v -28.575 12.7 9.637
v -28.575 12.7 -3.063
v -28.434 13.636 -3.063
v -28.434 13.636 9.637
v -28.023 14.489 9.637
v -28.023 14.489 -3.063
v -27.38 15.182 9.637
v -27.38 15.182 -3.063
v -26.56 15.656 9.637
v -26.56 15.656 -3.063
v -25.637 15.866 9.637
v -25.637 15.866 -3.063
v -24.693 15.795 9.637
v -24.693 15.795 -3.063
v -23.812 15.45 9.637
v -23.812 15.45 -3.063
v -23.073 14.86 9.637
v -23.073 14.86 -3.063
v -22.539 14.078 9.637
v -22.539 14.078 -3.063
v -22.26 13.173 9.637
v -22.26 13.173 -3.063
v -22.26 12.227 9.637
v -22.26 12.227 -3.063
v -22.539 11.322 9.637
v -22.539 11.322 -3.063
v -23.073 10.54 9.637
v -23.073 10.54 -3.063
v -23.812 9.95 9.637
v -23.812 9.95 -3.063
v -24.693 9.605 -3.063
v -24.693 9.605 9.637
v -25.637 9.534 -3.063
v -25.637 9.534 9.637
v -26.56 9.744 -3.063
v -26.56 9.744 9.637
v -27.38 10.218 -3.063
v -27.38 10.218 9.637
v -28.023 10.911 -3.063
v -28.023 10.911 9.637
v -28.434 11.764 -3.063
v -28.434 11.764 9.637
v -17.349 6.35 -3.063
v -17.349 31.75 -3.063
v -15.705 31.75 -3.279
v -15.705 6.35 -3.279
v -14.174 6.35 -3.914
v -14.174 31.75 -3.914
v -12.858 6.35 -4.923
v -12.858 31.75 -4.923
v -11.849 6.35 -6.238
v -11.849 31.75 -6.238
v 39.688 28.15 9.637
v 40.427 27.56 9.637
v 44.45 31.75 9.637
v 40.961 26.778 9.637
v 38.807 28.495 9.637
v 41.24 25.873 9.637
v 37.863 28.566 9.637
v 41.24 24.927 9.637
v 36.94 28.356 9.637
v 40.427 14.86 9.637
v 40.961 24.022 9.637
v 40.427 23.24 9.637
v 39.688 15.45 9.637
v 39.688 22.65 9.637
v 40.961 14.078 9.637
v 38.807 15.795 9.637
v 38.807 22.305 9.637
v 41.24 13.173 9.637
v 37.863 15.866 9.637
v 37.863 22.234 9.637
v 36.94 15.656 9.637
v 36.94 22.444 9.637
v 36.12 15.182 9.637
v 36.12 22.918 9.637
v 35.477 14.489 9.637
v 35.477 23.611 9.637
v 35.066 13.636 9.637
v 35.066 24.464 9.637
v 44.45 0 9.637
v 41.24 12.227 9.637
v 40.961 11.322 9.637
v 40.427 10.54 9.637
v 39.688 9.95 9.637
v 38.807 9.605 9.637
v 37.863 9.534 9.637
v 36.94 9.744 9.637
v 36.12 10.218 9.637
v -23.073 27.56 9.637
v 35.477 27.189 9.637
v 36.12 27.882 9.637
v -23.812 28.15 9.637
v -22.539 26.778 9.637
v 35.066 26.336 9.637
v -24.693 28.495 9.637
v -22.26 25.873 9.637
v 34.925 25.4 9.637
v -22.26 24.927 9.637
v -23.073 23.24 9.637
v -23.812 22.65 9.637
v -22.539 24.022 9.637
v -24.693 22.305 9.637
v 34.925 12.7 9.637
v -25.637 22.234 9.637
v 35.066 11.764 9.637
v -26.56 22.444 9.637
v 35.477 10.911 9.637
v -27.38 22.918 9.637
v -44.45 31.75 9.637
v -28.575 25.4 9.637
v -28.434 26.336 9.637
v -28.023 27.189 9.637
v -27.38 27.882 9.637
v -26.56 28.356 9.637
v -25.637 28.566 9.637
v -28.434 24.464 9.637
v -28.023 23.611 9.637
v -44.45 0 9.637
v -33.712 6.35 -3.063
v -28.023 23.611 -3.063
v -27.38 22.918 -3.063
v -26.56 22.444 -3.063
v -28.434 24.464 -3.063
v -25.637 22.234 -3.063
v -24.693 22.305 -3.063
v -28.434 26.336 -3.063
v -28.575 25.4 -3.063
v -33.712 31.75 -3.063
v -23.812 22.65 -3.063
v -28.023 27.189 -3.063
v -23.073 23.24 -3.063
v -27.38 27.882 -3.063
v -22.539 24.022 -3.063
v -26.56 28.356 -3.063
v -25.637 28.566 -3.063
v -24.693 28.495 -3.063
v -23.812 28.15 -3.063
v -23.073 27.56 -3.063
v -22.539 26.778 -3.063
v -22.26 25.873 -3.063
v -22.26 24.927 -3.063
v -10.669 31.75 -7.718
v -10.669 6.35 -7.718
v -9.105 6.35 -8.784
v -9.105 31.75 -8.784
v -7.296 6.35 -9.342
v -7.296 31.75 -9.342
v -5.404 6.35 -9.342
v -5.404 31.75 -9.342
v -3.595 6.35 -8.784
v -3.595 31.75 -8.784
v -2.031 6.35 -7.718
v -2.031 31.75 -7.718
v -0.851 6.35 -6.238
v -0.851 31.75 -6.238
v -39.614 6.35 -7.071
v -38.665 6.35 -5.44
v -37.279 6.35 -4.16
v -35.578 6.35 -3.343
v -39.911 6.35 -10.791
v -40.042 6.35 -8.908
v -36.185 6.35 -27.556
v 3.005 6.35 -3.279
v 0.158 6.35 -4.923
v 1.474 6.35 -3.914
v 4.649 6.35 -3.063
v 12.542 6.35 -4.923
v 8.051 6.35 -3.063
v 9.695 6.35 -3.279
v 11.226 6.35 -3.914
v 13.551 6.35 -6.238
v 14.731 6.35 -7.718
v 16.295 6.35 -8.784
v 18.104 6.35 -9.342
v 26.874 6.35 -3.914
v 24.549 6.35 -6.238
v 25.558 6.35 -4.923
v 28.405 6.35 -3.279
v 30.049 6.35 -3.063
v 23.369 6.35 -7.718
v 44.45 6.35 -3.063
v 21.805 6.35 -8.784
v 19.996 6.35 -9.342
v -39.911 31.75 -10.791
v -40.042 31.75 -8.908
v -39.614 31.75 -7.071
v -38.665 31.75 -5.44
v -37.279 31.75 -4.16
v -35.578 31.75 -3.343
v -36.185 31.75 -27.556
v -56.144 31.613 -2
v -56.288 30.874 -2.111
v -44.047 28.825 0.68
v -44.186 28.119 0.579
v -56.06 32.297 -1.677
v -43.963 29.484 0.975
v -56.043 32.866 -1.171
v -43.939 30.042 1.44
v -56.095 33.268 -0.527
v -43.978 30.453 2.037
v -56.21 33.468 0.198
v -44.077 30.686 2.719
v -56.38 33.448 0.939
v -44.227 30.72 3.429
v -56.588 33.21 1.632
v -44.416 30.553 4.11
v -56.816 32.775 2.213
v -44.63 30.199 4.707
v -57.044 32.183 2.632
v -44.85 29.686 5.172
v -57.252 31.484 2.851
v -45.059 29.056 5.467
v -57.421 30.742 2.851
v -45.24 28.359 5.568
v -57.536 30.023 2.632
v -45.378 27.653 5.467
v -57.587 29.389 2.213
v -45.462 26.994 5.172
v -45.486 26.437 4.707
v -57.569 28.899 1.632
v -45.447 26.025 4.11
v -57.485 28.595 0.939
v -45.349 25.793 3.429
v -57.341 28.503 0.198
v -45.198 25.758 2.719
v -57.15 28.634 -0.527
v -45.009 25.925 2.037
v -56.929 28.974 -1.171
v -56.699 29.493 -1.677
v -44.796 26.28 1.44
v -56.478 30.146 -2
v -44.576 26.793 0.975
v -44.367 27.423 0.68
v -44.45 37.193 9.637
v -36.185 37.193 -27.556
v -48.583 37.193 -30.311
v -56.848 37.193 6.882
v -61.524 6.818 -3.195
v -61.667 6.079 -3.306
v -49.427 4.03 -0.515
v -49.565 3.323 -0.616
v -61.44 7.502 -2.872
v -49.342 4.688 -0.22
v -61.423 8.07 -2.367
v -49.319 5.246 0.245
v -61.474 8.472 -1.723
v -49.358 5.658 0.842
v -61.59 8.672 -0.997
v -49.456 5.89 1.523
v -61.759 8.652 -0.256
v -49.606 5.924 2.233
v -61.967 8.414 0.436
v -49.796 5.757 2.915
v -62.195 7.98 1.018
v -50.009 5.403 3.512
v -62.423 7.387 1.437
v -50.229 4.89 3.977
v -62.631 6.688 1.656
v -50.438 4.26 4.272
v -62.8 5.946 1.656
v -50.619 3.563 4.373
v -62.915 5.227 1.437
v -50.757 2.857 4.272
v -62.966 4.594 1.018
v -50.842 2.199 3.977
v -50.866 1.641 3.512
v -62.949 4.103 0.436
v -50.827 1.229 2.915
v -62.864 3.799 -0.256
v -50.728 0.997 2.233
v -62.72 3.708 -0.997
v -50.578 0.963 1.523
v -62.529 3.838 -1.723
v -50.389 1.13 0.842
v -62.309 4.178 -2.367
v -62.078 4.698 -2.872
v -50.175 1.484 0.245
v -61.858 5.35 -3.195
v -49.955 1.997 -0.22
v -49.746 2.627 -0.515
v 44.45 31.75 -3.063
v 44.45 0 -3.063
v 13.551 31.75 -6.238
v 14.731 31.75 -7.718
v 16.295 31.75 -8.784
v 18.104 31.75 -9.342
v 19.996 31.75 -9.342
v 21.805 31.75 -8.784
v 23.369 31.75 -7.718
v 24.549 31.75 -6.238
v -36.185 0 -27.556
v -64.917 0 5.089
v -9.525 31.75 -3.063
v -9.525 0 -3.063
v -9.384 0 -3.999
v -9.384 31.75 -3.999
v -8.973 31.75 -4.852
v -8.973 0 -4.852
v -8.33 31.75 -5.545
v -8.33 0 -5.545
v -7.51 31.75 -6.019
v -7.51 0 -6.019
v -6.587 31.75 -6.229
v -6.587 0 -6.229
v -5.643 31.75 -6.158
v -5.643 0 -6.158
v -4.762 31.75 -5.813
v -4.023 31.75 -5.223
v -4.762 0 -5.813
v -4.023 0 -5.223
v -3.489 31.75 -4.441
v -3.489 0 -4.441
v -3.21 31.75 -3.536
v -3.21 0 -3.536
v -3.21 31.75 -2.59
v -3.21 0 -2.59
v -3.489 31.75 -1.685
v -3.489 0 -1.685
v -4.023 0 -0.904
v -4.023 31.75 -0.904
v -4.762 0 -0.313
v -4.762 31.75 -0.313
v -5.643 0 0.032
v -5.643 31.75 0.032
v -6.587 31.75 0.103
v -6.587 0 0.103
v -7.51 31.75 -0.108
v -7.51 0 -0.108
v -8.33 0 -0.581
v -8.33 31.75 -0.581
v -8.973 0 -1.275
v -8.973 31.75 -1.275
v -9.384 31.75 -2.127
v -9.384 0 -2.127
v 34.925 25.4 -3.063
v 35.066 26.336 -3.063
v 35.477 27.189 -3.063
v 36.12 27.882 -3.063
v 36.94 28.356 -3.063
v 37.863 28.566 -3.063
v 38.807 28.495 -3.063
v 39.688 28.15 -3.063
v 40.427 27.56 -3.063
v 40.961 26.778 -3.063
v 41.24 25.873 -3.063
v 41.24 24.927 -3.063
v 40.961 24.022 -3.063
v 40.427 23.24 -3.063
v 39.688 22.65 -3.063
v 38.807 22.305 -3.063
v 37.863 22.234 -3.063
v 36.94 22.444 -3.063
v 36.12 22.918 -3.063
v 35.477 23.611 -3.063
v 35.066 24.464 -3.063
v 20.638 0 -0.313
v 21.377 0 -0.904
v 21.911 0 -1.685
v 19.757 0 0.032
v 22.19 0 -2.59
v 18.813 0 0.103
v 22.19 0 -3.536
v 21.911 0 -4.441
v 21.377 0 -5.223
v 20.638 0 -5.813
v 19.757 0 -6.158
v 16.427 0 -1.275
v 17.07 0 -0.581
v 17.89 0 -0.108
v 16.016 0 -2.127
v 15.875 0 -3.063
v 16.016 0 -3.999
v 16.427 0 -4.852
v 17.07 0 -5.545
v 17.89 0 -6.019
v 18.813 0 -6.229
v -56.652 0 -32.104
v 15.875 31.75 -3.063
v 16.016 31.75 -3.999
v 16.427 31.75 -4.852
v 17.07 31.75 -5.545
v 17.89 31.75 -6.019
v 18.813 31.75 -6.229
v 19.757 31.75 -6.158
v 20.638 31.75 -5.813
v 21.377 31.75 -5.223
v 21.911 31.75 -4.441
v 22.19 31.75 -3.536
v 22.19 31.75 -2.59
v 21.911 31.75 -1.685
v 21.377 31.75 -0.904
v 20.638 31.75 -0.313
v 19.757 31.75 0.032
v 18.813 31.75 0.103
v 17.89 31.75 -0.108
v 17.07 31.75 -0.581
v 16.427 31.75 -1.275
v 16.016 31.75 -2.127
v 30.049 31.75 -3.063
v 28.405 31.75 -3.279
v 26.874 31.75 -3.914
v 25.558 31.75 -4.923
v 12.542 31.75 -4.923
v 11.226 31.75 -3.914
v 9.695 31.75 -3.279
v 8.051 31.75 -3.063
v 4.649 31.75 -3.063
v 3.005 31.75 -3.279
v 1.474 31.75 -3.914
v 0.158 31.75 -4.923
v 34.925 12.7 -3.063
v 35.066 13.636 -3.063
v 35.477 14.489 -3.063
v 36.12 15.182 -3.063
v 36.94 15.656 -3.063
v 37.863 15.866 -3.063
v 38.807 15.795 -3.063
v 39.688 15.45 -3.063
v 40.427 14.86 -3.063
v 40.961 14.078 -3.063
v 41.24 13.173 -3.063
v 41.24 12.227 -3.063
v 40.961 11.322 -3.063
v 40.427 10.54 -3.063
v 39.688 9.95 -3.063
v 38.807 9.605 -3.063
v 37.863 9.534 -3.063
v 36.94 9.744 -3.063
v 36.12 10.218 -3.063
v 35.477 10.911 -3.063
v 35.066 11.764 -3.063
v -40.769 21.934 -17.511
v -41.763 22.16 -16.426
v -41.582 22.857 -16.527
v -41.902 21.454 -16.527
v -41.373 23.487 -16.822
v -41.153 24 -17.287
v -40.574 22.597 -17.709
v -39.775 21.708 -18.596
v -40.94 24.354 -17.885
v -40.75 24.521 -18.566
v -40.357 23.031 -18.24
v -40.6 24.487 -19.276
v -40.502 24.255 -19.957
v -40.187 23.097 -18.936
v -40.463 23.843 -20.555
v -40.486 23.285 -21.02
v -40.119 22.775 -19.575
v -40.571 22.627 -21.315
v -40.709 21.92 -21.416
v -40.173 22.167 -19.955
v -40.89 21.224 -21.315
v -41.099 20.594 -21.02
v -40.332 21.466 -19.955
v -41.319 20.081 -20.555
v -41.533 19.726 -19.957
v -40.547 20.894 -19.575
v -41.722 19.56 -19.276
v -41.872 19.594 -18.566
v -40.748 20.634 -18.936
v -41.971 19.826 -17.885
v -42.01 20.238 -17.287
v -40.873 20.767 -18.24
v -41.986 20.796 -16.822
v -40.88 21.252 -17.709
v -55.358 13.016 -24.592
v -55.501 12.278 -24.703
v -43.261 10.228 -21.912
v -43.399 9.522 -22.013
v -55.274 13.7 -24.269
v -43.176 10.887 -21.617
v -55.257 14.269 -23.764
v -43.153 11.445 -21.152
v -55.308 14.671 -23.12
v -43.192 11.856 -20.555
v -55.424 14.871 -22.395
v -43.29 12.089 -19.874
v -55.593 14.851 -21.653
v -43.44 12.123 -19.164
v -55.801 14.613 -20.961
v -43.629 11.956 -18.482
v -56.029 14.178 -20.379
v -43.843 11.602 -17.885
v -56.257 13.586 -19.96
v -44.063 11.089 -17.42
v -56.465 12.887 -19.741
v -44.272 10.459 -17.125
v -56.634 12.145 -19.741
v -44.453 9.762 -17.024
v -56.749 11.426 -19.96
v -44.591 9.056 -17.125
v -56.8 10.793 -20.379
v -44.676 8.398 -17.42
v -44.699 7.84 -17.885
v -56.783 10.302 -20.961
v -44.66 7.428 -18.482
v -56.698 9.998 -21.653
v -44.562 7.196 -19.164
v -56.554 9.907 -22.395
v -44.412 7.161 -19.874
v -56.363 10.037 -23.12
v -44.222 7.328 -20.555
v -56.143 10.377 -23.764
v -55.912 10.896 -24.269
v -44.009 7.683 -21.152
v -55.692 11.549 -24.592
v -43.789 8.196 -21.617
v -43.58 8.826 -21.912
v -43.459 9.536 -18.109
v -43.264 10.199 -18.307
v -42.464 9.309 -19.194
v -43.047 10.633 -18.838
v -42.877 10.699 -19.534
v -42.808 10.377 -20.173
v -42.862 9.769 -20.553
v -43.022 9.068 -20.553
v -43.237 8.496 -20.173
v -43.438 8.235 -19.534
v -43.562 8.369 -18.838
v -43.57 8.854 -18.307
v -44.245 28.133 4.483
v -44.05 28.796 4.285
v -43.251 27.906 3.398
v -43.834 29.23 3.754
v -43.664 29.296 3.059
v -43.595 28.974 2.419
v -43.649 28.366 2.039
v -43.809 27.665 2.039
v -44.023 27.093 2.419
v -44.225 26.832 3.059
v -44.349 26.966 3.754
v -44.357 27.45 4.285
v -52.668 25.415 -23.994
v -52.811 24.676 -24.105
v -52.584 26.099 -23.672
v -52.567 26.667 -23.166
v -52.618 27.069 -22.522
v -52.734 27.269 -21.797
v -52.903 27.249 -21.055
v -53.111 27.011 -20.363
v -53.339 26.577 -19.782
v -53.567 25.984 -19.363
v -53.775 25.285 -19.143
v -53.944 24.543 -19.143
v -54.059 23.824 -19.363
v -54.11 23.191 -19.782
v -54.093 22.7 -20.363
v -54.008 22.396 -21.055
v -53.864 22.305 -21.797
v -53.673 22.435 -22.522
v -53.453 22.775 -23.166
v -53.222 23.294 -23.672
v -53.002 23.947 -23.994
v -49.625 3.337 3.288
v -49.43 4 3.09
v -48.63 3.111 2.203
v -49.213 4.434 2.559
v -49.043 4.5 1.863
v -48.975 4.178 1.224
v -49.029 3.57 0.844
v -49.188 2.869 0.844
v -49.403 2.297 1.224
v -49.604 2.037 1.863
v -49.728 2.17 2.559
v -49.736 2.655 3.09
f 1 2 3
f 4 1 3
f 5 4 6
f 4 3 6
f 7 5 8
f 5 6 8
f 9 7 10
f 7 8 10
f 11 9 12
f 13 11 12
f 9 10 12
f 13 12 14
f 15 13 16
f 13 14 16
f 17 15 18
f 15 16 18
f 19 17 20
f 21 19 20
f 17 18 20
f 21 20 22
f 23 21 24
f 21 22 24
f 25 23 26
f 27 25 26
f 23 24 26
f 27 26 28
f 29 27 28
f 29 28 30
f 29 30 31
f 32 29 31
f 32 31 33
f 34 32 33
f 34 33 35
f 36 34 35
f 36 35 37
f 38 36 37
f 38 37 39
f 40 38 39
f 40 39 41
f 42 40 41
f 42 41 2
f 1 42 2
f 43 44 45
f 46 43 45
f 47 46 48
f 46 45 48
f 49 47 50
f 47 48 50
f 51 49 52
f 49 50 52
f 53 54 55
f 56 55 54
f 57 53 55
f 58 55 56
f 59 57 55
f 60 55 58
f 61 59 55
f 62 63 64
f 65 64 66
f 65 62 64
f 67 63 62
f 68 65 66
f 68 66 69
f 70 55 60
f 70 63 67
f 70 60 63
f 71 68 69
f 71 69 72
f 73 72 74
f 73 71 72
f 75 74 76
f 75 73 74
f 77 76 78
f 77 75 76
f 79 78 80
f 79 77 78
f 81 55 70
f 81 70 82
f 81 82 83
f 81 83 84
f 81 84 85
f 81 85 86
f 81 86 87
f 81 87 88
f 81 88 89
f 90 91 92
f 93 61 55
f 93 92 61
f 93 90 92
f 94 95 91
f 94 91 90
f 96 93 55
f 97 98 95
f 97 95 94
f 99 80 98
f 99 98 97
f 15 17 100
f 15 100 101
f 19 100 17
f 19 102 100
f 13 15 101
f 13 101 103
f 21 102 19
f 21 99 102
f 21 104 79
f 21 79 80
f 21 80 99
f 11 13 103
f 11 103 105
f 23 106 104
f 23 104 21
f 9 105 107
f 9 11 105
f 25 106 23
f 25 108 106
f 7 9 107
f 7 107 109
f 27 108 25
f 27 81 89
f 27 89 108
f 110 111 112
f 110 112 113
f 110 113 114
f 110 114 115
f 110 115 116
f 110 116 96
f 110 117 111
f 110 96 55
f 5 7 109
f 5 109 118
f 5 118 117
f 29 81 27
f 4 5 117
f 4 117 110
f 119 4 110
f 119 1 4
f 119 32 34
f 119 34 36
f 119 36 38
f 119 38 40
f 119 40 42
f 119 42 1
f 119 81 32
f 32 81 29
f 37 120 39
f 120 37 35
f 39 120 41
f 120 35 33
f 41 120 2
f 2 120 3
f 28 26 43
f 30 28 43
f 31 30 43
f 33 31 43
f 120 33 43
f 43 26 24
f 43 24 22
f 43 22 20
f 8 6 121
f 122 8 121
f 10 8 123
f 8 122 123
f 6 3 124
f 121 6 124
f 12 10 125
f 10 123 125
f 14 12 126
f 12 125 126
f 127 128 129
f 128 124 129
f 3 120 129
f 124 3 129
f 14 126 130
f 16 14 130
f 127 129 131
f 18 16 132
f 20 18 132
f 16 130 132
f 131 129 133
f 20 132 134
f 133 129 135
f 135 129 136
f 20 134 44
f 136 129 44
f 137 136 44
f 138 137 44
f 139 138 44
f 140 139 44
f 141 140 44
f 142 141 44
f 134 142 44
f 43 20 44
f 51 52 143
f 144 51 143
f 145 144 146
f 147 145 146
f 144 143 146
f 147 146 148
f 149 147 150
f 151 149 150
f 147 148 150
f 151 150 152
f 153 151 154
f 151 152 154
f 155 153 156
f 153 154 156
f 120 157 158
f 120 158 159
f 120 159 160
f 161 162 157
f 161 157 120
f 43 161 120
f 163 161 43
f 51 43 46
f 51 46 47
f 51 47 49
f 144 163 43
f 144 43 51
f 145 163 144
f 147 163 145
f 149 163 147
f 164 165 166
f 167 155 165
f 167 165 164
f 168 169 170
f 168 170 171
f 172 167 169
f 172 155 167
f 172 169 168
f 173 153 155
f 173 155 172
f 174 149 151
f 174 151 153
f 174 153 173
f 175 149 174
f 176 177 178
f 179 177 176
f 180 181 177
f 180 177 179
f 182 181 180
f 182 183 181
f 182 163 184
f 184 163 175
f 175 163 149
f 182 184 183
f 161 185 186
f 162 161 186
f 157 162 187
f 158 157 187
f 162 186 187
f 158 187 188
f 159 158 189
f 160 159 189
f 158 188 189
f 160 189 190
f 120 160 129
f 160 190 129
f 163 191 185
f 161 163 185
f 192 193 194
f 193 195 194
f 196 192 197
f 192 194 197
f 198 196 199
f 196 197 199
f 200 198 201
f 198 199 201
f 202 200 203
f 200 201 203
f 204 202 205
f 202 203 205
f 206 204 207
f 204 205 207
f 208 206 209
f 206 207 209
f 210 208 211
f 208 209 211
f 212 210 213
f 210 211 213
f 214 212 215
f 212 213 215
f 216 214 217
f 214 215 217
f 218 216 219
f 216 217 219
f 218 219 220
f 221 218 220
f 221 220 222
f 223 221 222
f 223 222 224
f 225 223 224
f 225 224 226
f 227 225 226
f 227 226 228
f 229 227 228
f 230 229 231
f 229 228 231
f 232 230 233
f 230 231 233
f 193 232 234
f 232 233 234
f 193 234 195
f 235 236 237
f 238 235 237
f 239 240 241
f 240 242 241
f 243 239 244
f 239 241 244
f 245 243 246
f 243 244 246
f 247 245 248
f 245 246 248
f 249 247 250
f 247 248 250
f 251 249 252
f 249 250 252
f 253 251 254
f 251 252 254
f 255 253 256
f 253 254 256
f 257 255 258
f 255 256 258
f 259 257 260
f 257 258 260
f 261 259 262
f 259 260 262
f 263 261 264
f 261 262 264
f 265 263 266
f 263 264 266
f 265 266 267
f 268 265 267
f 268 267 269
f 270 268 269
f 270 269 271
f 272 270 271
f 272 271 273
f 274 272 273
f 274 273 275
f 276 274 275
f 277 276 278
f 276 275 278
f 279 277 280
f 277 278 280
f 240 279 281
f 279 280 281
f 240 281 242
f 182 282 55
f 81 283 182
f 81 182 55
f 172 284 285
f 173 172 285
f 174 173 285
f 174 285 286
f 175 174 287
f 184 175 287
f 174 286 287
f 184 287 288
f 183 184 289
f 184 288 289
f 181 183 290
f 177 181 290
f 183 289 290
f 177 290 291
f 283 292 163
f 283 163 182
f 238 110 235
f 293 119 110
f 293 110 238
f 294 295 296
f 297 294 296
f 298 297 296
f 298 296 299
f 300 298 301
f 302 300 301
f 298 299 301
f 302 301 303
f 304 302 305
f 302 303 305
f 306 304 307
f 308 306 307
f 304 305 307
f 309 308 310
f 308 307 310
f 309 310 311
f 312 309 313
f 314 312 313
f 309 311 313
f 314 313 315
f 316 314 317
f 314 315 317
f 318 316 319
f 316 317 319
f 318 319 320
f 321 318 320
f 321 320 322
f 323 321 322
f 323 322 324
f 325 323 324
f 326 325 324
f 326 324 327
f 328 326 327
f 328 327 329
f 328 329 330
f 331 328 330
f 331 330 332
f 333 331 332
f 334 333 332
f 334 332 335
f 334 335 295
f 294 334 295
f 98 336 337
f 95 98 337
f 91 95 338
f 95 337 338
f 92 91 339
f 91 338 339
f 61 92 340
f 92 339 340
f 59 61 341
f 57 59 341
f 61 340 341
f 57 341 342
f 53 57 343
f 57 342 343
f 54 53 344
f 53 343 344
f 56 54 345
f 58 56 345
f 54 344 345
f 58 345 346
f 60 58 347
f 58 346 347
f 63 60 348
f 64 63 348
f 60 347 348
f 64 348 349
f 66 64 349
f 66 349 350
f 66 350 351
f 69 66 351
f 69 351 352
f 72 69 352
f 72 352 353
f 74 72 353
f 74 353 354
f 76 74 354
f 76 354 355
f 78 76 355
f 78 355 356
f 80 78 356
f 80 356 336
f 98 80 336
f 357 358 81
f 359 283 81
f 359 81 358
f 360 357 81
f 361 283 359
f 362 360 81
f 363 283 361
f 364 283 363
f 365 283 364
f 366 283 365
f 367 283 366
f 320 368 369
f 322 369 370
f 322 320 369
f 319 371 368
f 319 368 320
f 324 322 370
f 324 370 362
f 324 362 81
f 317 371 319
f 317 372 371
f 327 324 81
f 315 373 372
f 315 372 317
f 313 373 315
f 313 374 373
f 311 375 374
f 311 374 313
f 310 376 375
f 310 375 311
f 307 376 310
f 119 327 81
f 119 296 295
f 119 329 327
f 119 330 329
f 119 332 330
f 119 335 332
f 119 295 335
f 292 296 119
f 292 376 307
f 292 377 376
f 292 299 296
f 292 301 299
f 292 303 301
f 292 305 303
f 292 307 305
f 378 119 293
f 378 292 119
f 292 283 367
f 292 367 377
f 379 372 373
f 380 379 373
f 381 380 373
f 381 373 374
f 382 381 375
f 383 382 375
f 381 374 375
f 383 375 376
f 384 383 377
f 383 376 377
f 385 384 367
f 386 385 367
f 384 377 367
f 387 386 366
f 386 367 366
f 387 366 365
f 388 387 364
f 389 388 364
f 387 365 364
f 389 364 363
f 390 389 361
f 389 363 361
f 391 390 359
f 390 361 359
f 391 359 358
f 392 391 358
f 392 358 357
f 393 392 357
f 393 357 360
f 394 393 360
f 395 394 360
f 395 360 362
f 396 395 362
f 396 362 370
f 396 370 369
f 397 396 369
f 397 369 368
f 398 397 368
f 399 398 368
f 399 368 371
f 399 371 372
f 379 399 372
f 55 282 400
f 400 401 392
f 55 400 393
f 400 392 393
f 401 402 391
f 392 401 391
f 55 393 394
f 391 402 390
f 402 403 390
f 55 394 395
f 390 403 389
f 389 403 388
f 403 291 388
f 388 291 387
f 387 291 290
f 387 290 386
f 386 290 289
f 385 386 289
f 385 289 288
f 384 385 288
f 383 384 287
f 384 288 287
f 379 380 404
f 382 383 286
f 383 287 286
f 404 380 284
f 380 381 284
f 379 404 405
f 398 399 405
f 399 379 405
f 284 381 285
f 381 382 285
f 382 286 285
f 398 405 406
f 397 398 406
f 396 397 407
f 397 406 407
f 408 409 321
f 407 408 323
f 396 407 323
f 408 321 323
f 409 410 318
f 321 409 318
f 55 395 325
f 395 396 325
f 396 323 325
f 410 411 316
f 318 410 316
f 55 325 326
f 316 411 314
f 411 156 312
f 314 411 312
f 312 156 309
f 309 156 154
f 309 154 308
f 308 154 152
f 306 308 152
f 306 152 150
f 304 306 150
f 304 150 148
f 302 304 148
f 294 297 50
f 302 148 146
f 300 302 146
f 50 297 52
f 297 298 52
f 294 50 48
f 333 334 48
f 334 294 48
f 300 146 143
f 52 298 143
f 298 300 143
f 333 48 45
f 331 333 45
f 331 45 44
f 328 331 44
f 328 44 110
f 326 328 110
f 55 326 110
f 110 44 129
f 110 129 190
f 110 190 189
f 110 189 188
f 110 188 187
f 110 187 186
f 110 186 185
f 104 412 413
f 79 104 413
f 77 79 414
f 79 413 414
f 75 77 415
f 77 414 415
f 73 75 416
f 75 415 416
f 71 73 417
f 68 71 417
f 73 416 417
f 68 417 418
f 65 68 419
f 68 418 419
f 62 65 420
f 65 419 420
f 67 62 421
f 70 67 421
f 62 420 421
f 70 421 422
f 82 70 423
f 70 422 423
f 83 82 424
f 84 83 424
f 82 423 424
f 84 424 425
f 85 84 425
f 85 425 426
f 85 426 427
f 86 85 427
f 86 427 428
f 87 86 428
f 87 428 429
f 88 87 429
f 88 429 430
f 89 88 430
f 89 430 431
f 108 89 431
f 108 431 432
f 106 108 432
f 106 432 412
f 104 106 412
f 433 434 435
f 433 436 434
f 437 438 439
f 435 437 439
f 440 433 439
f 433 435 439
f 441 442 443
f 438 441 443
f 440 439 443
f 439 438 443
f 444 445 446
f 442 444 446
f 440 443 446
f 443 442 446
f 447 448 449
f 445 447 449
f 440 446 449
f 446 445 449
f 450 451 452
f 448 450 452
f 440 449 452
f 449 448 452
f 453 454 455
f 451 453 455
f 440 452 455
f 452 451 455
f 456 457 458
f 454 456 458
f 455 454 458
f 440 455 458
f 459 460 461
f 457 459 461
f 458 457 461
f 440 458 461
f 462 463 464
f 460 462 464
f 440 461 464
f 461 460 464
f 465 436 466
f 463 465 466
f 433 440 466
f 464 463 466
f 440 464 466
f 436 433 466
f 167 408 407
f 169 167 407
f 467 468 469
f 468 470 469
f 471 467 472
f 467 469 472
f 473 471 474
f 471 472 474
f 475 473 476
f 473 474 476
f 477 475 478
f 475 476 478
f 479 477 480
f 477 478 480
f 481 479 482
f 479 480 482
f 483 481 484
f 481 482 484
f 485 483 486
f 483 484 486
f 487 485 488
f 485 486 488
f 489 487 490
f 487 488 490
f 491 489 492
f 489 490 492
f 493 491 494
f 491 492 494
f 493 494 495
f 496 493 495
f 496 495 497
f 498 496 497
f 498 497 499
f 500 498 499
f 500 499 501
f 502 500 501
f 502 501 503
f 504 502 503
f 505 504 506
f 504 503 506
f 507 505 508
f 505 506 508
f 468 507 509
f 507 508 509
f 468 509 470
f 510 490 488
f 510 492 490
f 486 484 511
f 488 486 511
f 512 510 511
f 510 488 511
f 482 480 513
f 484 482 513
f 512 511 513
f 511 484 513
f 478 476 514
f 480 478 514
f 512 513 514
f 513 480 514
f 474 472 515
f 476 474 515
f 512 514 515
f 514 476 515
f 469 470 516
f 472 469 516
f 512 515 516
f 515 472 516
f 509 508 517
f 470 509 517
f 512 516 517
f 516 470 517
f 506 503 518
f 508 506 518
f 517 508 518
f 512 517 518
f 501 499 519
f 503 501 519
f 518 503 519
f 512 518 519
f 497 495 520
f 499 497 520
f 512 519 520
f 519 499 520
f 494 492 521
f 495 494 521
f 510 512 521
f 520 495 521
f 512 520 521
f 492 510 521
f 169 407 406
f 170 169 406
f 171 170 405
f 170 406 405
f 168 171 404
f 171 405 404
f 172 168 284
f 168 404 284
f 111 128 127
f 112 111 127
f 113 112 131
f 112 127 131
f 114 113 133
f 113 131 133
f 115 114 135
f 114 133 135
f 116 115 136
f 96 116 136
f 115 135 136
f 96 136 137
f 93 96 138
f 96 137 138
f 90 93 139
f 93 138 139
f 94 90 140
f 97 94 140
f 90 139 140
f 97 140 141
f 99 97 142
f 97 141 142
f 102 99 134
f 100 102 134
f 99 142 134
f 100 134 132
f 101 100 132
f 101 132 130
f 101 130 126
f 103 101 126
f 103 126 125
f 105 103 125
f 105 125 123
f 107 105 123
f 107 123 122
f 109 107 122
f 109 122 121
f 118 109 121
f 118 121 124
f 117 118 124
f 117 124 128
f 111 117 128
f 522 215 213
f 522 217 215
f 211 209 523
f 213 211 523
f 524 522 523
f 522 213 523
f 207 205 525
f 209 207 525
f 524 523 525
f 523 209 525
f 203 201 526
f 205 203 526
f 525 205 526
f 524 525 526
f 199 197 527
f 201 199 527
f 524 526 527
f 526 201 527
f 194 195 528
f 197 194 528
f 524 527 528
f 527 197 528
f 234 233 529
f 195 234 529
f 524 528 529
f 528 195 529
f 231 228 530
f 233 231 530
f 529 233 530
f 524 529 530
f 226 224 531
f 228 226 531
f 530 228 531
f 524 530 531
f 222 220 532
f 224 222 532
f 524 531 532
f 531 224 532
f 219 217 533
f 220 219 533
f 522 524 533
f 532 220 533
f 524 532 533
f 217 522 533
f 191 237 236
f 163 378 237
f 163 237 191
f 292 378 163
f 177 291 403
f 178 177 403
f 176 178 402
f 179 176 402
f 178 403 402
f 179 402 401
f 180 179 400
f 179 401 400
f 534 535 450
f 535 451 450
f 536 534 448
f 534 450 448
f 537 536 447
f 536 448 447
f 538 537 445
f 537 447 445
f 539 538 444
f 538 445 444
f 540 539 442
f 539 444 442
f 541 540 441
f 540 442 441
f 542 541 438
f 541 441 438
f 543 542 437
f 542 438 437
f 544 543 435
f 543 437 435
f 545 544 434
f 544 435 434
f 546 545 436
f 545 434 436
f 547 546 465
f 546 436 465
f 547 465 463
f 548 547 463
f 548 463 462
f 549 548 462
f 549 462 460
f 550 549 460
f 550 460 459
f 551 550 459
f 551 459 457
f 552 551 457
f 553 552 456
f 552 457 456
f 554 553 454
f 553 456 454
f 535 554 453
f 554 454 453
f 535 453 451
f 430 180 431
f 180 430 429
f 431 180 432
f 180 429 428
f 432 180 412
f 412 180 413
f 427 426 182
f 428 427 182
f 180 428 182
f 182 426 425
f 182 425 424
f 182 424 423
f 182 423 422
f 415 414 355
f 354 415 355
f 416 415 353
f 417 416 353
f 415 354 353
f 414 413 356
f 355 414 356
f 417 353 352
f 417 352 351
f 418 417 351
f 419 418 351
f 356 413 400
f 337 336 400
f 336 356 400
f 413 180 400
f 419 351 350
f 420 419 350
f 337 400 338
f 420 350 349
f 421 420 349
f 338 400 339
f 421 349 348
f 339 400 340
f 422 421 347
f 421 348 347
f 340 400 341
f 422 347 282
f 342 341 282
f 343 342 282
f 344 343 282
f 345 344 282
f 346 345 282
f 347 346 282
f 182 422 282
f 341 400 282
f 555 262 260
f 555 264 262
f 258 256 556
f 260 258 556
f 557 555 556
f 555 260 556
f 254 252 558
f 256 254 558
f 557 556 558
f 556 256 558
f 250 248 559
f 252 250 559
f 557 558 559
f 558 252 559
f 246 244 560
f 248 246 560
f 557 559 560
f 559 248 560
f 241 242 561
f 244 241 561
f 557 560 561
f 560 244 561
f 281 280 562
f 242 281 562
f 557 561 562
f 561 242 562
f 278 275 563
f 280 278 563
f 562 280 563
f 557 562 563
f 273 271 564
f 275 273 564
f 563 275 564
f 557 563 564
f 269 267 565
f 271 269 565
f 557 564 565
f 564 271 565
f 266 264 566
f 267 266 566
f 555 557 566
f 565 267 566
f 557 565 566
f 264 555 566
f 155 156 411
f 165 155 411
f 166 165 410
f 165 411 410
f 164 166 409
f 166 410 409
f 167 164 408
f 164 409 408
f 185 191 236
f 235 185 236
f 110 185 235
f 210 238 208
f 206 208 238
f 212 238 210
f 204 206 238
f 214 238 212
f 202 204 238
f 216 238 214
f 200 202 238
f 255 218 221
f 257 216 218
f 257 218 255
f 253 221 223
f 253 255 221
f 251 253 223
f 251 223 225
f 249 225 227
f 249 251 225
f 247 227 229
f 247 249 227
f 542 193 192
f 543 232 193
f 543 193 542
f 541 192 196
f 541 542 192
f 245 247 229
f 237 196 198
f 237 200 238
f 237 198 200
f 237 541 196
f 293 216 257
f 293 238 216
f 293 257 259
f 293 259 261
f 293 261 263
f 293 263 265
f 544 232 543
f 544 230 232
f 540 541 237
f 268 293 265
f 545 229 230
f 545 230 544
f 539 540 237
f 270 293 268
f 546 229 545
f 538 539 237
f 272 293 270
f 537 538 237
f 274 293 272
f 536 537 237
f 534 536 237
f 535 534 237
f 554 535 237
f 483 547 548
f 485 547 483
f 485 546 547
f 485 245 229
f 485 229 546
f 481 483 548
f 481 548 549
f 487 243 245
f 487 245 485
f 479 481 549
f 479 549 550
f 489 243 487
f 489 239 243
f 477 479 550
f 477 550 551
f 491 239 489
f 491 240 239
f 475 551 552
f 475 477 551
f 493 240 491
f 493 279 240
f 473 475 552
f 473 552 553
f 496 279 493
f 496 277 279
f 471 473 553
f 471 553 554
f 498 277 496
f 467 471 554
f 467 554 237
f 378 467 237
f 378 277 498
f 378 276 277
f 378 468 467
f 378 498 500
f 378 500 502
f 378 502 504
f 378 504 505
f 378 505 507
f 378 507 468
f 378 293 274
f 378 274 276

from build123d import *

# Parameters (mm, degrees)
BOSS_EXTRUDE1_DEPTH             = 37.19322
BOSS_EXTRUDE2_DEPTH             = 31.75
DRAFT1_ANGLE                    = 12.53
F_1_4_0_25_DIAMETER_HOLE2_D     = 6.35
CUT_EXTRUDE2_DEPTH              = 25.4
F_1_4_0_25_DIAMETER_HOLE3_D     = 6.35
F_1_4_0_25_DIAMETER_HOLE3_DEPTH = 31.75
F_1_4_0_25_DIAMETER_HOLE3_TIP   = 1.907732465
F_1_4_20_TAPPED_HOLE1_D         = 5.1054
F_1_4_20_TAPPED_HOLE1_DEPTH     = 12.7
F_1_4_20_TAPPED_HOLE1_TIP       = 1.533816902


with BuildPart() as part:
    # Sketch1 → Boss-Extrude1 (new body)
    with BuildSketch(Plane(origin=(0, 0, 0), x_dir=(1, 0, 0), z_dir=(0, 1, 0))):
        Polygon((-48.582525221, 30.31081915), (-36.184949557, 27.555802336), (-44.45, -9.636924657), (-56.847575664, -6.881907843), align=None)
    extrude(amount=BOSS_EXTRUDE1_DEPTH)

    # Sketch8 → Boss-Extrude2 (add)
    with BuildSketch(Plane(origin=(0, 0, 0), x_dir=(1, 0, 0), z_dir=(0, 1, 0))):
        Polygon((-36.184949557, 27.555802336), (44.45, 3.063075343), (44.45, -9.636924657), (-44.45, -9.636924657), align=None)
    extrude(amount=BOSS_EXTRUDE2_DEPTH)

    # Draft1
    draft1_faces = [part.faces().sort_by_distance(p)[0] for p in [
        (-52.715050443, 18.59661, -11.714455654),
    ]]
    draft(draft1_faces, Plane.ZX.offset(37.19322), DRAFT1_ANGLE)

    # 1/4 (0.25) Diameter Hole2 (through all)
    with Locations(Plane(origin=(0, 31.75, 0), x_dir=(1, 0, 0), z_dir=(0, 1, 0))):
        with Locations((-6.35, 3.063075343), (19.05, 3.063075343)):
            Hole(F_1_4_0_25_DIAMETER_HOLE2_D / 2)

    # Sketch13 → Cut-Extrude2 (cut)
    with BuildSketch(Plane(origin=(0, 31.75, 0), x_dir=(1, 0, 0), z_dir=(0, 1, 0))):
        with BuildLine():
            Line((-36.184949557, 27.555802336), (-39.910553687, 10.79058375))
            ThreePointArc((-39.910553687, 10.79058375), (-38.665031363, 5.439706394), (-33.711765855, 3.063075343))
            Line((-33.711765855, 3.063075343), (-17.348522628, 3.063075343))
            ThreePointArc((-17.348522628, 3.063075343), (-14.173522628, 3.913814029), (-11.849261314, 6.238075343))
            ThreePointArc((-11.849261314, 6.238075343), (-6.35, 9.413075343), (-0.850738686, 6.238075343))
            ThreePointArc((-0.850738686, 6.238075343), (1.473522628, 3.913814029), (4.648522628, 3.063075343))
            Line((4.648522628, 3.063075343), (8.051477372, 3.063075343))
            ThreePointArc((8.051477372, 3.063075343), (11.226477372, 3.913814029), (13.550738686, 6.238075343))
            ThreePointArc((13.550738686, 6.238075343), (19.05, 9.413075343), (24.549261314, 6.238075343))
            ThreePointArc((24.549261314, 6.238075343), (26.873522628, 3.913814029), (30.048522628, 3.063075343))
            Line((30.048522628, 3.063075343), (44.45, 3.063075343))
            Line((44.45, 3.063075343), (-36.184949557, 27.555802336))
        make_face()
    extrude(amount=-CUT_EXTRUDE2_DEPTH, mode=Mode.SUBTRACT)

    # 1/4 (0.25) Diameter Hole3
    with Locations(Plane.XY.offset(9.636924657)):
        with Locations((38.1, 25.4), (38.1, 12.7), (-25.4, 25.4), (-25.4, 12.7)):
            Hole(F_1_4_0_25_DIAMETER_HOLE3_D / 2, depth=F_1_4_0_25_DIAMETER_HOLE3_DEPTH)
            with Locations((0, 0, -(F_1_4_0_25_DIAMETER_HOLE3_DEPTH + F_1_4_0_25_DIAMETER_HOLE3_TIP / 2))):  # 118° drill point
                Cone(0, F_1_4_0_25_DIAMETER_HOLE3_D / 2, F_1_4_0_25_DIAMETER_HOLE3_TIP, mode=Mode.SUBTRACT)

    # 1/4-20 Tapped Hole1
    with Locations(Plane(origin=(-57.923217538, 13.187114971, -12.87182612), x_dir=(-0.20648022911920935, 0.04700841279958709, 0.977320891063392), z_dir=(-0.9529367695675907, 0.2169507716396215, -0.21176372657057574))):
        with Locations((13.563707416, 17.609083513), (12.340640779, -7.762134727), (-8.941294908, 12.336703083), (-9.552900666, -0.349243556)):
            Hole(F_1_4_20_TAPPED_HOLE1_D / 2, depth=F_1_4_20_TAPPED_HOLE1_DEPTH)
            with Locations((0, 0, -(F_1_4_20_TAPPED_HOLE1_DEPTH + F_1_4_20_TAPPED_HOLE1_TIP / 2))):  # 118° drill point
                Cone(0, F_1_4_20_TAPPED_HOLE1_D / 2, F_1_4_20_TAPPED_HOLE1_TIP, mode=Mode.SUBTRACT)


solid = part.part
